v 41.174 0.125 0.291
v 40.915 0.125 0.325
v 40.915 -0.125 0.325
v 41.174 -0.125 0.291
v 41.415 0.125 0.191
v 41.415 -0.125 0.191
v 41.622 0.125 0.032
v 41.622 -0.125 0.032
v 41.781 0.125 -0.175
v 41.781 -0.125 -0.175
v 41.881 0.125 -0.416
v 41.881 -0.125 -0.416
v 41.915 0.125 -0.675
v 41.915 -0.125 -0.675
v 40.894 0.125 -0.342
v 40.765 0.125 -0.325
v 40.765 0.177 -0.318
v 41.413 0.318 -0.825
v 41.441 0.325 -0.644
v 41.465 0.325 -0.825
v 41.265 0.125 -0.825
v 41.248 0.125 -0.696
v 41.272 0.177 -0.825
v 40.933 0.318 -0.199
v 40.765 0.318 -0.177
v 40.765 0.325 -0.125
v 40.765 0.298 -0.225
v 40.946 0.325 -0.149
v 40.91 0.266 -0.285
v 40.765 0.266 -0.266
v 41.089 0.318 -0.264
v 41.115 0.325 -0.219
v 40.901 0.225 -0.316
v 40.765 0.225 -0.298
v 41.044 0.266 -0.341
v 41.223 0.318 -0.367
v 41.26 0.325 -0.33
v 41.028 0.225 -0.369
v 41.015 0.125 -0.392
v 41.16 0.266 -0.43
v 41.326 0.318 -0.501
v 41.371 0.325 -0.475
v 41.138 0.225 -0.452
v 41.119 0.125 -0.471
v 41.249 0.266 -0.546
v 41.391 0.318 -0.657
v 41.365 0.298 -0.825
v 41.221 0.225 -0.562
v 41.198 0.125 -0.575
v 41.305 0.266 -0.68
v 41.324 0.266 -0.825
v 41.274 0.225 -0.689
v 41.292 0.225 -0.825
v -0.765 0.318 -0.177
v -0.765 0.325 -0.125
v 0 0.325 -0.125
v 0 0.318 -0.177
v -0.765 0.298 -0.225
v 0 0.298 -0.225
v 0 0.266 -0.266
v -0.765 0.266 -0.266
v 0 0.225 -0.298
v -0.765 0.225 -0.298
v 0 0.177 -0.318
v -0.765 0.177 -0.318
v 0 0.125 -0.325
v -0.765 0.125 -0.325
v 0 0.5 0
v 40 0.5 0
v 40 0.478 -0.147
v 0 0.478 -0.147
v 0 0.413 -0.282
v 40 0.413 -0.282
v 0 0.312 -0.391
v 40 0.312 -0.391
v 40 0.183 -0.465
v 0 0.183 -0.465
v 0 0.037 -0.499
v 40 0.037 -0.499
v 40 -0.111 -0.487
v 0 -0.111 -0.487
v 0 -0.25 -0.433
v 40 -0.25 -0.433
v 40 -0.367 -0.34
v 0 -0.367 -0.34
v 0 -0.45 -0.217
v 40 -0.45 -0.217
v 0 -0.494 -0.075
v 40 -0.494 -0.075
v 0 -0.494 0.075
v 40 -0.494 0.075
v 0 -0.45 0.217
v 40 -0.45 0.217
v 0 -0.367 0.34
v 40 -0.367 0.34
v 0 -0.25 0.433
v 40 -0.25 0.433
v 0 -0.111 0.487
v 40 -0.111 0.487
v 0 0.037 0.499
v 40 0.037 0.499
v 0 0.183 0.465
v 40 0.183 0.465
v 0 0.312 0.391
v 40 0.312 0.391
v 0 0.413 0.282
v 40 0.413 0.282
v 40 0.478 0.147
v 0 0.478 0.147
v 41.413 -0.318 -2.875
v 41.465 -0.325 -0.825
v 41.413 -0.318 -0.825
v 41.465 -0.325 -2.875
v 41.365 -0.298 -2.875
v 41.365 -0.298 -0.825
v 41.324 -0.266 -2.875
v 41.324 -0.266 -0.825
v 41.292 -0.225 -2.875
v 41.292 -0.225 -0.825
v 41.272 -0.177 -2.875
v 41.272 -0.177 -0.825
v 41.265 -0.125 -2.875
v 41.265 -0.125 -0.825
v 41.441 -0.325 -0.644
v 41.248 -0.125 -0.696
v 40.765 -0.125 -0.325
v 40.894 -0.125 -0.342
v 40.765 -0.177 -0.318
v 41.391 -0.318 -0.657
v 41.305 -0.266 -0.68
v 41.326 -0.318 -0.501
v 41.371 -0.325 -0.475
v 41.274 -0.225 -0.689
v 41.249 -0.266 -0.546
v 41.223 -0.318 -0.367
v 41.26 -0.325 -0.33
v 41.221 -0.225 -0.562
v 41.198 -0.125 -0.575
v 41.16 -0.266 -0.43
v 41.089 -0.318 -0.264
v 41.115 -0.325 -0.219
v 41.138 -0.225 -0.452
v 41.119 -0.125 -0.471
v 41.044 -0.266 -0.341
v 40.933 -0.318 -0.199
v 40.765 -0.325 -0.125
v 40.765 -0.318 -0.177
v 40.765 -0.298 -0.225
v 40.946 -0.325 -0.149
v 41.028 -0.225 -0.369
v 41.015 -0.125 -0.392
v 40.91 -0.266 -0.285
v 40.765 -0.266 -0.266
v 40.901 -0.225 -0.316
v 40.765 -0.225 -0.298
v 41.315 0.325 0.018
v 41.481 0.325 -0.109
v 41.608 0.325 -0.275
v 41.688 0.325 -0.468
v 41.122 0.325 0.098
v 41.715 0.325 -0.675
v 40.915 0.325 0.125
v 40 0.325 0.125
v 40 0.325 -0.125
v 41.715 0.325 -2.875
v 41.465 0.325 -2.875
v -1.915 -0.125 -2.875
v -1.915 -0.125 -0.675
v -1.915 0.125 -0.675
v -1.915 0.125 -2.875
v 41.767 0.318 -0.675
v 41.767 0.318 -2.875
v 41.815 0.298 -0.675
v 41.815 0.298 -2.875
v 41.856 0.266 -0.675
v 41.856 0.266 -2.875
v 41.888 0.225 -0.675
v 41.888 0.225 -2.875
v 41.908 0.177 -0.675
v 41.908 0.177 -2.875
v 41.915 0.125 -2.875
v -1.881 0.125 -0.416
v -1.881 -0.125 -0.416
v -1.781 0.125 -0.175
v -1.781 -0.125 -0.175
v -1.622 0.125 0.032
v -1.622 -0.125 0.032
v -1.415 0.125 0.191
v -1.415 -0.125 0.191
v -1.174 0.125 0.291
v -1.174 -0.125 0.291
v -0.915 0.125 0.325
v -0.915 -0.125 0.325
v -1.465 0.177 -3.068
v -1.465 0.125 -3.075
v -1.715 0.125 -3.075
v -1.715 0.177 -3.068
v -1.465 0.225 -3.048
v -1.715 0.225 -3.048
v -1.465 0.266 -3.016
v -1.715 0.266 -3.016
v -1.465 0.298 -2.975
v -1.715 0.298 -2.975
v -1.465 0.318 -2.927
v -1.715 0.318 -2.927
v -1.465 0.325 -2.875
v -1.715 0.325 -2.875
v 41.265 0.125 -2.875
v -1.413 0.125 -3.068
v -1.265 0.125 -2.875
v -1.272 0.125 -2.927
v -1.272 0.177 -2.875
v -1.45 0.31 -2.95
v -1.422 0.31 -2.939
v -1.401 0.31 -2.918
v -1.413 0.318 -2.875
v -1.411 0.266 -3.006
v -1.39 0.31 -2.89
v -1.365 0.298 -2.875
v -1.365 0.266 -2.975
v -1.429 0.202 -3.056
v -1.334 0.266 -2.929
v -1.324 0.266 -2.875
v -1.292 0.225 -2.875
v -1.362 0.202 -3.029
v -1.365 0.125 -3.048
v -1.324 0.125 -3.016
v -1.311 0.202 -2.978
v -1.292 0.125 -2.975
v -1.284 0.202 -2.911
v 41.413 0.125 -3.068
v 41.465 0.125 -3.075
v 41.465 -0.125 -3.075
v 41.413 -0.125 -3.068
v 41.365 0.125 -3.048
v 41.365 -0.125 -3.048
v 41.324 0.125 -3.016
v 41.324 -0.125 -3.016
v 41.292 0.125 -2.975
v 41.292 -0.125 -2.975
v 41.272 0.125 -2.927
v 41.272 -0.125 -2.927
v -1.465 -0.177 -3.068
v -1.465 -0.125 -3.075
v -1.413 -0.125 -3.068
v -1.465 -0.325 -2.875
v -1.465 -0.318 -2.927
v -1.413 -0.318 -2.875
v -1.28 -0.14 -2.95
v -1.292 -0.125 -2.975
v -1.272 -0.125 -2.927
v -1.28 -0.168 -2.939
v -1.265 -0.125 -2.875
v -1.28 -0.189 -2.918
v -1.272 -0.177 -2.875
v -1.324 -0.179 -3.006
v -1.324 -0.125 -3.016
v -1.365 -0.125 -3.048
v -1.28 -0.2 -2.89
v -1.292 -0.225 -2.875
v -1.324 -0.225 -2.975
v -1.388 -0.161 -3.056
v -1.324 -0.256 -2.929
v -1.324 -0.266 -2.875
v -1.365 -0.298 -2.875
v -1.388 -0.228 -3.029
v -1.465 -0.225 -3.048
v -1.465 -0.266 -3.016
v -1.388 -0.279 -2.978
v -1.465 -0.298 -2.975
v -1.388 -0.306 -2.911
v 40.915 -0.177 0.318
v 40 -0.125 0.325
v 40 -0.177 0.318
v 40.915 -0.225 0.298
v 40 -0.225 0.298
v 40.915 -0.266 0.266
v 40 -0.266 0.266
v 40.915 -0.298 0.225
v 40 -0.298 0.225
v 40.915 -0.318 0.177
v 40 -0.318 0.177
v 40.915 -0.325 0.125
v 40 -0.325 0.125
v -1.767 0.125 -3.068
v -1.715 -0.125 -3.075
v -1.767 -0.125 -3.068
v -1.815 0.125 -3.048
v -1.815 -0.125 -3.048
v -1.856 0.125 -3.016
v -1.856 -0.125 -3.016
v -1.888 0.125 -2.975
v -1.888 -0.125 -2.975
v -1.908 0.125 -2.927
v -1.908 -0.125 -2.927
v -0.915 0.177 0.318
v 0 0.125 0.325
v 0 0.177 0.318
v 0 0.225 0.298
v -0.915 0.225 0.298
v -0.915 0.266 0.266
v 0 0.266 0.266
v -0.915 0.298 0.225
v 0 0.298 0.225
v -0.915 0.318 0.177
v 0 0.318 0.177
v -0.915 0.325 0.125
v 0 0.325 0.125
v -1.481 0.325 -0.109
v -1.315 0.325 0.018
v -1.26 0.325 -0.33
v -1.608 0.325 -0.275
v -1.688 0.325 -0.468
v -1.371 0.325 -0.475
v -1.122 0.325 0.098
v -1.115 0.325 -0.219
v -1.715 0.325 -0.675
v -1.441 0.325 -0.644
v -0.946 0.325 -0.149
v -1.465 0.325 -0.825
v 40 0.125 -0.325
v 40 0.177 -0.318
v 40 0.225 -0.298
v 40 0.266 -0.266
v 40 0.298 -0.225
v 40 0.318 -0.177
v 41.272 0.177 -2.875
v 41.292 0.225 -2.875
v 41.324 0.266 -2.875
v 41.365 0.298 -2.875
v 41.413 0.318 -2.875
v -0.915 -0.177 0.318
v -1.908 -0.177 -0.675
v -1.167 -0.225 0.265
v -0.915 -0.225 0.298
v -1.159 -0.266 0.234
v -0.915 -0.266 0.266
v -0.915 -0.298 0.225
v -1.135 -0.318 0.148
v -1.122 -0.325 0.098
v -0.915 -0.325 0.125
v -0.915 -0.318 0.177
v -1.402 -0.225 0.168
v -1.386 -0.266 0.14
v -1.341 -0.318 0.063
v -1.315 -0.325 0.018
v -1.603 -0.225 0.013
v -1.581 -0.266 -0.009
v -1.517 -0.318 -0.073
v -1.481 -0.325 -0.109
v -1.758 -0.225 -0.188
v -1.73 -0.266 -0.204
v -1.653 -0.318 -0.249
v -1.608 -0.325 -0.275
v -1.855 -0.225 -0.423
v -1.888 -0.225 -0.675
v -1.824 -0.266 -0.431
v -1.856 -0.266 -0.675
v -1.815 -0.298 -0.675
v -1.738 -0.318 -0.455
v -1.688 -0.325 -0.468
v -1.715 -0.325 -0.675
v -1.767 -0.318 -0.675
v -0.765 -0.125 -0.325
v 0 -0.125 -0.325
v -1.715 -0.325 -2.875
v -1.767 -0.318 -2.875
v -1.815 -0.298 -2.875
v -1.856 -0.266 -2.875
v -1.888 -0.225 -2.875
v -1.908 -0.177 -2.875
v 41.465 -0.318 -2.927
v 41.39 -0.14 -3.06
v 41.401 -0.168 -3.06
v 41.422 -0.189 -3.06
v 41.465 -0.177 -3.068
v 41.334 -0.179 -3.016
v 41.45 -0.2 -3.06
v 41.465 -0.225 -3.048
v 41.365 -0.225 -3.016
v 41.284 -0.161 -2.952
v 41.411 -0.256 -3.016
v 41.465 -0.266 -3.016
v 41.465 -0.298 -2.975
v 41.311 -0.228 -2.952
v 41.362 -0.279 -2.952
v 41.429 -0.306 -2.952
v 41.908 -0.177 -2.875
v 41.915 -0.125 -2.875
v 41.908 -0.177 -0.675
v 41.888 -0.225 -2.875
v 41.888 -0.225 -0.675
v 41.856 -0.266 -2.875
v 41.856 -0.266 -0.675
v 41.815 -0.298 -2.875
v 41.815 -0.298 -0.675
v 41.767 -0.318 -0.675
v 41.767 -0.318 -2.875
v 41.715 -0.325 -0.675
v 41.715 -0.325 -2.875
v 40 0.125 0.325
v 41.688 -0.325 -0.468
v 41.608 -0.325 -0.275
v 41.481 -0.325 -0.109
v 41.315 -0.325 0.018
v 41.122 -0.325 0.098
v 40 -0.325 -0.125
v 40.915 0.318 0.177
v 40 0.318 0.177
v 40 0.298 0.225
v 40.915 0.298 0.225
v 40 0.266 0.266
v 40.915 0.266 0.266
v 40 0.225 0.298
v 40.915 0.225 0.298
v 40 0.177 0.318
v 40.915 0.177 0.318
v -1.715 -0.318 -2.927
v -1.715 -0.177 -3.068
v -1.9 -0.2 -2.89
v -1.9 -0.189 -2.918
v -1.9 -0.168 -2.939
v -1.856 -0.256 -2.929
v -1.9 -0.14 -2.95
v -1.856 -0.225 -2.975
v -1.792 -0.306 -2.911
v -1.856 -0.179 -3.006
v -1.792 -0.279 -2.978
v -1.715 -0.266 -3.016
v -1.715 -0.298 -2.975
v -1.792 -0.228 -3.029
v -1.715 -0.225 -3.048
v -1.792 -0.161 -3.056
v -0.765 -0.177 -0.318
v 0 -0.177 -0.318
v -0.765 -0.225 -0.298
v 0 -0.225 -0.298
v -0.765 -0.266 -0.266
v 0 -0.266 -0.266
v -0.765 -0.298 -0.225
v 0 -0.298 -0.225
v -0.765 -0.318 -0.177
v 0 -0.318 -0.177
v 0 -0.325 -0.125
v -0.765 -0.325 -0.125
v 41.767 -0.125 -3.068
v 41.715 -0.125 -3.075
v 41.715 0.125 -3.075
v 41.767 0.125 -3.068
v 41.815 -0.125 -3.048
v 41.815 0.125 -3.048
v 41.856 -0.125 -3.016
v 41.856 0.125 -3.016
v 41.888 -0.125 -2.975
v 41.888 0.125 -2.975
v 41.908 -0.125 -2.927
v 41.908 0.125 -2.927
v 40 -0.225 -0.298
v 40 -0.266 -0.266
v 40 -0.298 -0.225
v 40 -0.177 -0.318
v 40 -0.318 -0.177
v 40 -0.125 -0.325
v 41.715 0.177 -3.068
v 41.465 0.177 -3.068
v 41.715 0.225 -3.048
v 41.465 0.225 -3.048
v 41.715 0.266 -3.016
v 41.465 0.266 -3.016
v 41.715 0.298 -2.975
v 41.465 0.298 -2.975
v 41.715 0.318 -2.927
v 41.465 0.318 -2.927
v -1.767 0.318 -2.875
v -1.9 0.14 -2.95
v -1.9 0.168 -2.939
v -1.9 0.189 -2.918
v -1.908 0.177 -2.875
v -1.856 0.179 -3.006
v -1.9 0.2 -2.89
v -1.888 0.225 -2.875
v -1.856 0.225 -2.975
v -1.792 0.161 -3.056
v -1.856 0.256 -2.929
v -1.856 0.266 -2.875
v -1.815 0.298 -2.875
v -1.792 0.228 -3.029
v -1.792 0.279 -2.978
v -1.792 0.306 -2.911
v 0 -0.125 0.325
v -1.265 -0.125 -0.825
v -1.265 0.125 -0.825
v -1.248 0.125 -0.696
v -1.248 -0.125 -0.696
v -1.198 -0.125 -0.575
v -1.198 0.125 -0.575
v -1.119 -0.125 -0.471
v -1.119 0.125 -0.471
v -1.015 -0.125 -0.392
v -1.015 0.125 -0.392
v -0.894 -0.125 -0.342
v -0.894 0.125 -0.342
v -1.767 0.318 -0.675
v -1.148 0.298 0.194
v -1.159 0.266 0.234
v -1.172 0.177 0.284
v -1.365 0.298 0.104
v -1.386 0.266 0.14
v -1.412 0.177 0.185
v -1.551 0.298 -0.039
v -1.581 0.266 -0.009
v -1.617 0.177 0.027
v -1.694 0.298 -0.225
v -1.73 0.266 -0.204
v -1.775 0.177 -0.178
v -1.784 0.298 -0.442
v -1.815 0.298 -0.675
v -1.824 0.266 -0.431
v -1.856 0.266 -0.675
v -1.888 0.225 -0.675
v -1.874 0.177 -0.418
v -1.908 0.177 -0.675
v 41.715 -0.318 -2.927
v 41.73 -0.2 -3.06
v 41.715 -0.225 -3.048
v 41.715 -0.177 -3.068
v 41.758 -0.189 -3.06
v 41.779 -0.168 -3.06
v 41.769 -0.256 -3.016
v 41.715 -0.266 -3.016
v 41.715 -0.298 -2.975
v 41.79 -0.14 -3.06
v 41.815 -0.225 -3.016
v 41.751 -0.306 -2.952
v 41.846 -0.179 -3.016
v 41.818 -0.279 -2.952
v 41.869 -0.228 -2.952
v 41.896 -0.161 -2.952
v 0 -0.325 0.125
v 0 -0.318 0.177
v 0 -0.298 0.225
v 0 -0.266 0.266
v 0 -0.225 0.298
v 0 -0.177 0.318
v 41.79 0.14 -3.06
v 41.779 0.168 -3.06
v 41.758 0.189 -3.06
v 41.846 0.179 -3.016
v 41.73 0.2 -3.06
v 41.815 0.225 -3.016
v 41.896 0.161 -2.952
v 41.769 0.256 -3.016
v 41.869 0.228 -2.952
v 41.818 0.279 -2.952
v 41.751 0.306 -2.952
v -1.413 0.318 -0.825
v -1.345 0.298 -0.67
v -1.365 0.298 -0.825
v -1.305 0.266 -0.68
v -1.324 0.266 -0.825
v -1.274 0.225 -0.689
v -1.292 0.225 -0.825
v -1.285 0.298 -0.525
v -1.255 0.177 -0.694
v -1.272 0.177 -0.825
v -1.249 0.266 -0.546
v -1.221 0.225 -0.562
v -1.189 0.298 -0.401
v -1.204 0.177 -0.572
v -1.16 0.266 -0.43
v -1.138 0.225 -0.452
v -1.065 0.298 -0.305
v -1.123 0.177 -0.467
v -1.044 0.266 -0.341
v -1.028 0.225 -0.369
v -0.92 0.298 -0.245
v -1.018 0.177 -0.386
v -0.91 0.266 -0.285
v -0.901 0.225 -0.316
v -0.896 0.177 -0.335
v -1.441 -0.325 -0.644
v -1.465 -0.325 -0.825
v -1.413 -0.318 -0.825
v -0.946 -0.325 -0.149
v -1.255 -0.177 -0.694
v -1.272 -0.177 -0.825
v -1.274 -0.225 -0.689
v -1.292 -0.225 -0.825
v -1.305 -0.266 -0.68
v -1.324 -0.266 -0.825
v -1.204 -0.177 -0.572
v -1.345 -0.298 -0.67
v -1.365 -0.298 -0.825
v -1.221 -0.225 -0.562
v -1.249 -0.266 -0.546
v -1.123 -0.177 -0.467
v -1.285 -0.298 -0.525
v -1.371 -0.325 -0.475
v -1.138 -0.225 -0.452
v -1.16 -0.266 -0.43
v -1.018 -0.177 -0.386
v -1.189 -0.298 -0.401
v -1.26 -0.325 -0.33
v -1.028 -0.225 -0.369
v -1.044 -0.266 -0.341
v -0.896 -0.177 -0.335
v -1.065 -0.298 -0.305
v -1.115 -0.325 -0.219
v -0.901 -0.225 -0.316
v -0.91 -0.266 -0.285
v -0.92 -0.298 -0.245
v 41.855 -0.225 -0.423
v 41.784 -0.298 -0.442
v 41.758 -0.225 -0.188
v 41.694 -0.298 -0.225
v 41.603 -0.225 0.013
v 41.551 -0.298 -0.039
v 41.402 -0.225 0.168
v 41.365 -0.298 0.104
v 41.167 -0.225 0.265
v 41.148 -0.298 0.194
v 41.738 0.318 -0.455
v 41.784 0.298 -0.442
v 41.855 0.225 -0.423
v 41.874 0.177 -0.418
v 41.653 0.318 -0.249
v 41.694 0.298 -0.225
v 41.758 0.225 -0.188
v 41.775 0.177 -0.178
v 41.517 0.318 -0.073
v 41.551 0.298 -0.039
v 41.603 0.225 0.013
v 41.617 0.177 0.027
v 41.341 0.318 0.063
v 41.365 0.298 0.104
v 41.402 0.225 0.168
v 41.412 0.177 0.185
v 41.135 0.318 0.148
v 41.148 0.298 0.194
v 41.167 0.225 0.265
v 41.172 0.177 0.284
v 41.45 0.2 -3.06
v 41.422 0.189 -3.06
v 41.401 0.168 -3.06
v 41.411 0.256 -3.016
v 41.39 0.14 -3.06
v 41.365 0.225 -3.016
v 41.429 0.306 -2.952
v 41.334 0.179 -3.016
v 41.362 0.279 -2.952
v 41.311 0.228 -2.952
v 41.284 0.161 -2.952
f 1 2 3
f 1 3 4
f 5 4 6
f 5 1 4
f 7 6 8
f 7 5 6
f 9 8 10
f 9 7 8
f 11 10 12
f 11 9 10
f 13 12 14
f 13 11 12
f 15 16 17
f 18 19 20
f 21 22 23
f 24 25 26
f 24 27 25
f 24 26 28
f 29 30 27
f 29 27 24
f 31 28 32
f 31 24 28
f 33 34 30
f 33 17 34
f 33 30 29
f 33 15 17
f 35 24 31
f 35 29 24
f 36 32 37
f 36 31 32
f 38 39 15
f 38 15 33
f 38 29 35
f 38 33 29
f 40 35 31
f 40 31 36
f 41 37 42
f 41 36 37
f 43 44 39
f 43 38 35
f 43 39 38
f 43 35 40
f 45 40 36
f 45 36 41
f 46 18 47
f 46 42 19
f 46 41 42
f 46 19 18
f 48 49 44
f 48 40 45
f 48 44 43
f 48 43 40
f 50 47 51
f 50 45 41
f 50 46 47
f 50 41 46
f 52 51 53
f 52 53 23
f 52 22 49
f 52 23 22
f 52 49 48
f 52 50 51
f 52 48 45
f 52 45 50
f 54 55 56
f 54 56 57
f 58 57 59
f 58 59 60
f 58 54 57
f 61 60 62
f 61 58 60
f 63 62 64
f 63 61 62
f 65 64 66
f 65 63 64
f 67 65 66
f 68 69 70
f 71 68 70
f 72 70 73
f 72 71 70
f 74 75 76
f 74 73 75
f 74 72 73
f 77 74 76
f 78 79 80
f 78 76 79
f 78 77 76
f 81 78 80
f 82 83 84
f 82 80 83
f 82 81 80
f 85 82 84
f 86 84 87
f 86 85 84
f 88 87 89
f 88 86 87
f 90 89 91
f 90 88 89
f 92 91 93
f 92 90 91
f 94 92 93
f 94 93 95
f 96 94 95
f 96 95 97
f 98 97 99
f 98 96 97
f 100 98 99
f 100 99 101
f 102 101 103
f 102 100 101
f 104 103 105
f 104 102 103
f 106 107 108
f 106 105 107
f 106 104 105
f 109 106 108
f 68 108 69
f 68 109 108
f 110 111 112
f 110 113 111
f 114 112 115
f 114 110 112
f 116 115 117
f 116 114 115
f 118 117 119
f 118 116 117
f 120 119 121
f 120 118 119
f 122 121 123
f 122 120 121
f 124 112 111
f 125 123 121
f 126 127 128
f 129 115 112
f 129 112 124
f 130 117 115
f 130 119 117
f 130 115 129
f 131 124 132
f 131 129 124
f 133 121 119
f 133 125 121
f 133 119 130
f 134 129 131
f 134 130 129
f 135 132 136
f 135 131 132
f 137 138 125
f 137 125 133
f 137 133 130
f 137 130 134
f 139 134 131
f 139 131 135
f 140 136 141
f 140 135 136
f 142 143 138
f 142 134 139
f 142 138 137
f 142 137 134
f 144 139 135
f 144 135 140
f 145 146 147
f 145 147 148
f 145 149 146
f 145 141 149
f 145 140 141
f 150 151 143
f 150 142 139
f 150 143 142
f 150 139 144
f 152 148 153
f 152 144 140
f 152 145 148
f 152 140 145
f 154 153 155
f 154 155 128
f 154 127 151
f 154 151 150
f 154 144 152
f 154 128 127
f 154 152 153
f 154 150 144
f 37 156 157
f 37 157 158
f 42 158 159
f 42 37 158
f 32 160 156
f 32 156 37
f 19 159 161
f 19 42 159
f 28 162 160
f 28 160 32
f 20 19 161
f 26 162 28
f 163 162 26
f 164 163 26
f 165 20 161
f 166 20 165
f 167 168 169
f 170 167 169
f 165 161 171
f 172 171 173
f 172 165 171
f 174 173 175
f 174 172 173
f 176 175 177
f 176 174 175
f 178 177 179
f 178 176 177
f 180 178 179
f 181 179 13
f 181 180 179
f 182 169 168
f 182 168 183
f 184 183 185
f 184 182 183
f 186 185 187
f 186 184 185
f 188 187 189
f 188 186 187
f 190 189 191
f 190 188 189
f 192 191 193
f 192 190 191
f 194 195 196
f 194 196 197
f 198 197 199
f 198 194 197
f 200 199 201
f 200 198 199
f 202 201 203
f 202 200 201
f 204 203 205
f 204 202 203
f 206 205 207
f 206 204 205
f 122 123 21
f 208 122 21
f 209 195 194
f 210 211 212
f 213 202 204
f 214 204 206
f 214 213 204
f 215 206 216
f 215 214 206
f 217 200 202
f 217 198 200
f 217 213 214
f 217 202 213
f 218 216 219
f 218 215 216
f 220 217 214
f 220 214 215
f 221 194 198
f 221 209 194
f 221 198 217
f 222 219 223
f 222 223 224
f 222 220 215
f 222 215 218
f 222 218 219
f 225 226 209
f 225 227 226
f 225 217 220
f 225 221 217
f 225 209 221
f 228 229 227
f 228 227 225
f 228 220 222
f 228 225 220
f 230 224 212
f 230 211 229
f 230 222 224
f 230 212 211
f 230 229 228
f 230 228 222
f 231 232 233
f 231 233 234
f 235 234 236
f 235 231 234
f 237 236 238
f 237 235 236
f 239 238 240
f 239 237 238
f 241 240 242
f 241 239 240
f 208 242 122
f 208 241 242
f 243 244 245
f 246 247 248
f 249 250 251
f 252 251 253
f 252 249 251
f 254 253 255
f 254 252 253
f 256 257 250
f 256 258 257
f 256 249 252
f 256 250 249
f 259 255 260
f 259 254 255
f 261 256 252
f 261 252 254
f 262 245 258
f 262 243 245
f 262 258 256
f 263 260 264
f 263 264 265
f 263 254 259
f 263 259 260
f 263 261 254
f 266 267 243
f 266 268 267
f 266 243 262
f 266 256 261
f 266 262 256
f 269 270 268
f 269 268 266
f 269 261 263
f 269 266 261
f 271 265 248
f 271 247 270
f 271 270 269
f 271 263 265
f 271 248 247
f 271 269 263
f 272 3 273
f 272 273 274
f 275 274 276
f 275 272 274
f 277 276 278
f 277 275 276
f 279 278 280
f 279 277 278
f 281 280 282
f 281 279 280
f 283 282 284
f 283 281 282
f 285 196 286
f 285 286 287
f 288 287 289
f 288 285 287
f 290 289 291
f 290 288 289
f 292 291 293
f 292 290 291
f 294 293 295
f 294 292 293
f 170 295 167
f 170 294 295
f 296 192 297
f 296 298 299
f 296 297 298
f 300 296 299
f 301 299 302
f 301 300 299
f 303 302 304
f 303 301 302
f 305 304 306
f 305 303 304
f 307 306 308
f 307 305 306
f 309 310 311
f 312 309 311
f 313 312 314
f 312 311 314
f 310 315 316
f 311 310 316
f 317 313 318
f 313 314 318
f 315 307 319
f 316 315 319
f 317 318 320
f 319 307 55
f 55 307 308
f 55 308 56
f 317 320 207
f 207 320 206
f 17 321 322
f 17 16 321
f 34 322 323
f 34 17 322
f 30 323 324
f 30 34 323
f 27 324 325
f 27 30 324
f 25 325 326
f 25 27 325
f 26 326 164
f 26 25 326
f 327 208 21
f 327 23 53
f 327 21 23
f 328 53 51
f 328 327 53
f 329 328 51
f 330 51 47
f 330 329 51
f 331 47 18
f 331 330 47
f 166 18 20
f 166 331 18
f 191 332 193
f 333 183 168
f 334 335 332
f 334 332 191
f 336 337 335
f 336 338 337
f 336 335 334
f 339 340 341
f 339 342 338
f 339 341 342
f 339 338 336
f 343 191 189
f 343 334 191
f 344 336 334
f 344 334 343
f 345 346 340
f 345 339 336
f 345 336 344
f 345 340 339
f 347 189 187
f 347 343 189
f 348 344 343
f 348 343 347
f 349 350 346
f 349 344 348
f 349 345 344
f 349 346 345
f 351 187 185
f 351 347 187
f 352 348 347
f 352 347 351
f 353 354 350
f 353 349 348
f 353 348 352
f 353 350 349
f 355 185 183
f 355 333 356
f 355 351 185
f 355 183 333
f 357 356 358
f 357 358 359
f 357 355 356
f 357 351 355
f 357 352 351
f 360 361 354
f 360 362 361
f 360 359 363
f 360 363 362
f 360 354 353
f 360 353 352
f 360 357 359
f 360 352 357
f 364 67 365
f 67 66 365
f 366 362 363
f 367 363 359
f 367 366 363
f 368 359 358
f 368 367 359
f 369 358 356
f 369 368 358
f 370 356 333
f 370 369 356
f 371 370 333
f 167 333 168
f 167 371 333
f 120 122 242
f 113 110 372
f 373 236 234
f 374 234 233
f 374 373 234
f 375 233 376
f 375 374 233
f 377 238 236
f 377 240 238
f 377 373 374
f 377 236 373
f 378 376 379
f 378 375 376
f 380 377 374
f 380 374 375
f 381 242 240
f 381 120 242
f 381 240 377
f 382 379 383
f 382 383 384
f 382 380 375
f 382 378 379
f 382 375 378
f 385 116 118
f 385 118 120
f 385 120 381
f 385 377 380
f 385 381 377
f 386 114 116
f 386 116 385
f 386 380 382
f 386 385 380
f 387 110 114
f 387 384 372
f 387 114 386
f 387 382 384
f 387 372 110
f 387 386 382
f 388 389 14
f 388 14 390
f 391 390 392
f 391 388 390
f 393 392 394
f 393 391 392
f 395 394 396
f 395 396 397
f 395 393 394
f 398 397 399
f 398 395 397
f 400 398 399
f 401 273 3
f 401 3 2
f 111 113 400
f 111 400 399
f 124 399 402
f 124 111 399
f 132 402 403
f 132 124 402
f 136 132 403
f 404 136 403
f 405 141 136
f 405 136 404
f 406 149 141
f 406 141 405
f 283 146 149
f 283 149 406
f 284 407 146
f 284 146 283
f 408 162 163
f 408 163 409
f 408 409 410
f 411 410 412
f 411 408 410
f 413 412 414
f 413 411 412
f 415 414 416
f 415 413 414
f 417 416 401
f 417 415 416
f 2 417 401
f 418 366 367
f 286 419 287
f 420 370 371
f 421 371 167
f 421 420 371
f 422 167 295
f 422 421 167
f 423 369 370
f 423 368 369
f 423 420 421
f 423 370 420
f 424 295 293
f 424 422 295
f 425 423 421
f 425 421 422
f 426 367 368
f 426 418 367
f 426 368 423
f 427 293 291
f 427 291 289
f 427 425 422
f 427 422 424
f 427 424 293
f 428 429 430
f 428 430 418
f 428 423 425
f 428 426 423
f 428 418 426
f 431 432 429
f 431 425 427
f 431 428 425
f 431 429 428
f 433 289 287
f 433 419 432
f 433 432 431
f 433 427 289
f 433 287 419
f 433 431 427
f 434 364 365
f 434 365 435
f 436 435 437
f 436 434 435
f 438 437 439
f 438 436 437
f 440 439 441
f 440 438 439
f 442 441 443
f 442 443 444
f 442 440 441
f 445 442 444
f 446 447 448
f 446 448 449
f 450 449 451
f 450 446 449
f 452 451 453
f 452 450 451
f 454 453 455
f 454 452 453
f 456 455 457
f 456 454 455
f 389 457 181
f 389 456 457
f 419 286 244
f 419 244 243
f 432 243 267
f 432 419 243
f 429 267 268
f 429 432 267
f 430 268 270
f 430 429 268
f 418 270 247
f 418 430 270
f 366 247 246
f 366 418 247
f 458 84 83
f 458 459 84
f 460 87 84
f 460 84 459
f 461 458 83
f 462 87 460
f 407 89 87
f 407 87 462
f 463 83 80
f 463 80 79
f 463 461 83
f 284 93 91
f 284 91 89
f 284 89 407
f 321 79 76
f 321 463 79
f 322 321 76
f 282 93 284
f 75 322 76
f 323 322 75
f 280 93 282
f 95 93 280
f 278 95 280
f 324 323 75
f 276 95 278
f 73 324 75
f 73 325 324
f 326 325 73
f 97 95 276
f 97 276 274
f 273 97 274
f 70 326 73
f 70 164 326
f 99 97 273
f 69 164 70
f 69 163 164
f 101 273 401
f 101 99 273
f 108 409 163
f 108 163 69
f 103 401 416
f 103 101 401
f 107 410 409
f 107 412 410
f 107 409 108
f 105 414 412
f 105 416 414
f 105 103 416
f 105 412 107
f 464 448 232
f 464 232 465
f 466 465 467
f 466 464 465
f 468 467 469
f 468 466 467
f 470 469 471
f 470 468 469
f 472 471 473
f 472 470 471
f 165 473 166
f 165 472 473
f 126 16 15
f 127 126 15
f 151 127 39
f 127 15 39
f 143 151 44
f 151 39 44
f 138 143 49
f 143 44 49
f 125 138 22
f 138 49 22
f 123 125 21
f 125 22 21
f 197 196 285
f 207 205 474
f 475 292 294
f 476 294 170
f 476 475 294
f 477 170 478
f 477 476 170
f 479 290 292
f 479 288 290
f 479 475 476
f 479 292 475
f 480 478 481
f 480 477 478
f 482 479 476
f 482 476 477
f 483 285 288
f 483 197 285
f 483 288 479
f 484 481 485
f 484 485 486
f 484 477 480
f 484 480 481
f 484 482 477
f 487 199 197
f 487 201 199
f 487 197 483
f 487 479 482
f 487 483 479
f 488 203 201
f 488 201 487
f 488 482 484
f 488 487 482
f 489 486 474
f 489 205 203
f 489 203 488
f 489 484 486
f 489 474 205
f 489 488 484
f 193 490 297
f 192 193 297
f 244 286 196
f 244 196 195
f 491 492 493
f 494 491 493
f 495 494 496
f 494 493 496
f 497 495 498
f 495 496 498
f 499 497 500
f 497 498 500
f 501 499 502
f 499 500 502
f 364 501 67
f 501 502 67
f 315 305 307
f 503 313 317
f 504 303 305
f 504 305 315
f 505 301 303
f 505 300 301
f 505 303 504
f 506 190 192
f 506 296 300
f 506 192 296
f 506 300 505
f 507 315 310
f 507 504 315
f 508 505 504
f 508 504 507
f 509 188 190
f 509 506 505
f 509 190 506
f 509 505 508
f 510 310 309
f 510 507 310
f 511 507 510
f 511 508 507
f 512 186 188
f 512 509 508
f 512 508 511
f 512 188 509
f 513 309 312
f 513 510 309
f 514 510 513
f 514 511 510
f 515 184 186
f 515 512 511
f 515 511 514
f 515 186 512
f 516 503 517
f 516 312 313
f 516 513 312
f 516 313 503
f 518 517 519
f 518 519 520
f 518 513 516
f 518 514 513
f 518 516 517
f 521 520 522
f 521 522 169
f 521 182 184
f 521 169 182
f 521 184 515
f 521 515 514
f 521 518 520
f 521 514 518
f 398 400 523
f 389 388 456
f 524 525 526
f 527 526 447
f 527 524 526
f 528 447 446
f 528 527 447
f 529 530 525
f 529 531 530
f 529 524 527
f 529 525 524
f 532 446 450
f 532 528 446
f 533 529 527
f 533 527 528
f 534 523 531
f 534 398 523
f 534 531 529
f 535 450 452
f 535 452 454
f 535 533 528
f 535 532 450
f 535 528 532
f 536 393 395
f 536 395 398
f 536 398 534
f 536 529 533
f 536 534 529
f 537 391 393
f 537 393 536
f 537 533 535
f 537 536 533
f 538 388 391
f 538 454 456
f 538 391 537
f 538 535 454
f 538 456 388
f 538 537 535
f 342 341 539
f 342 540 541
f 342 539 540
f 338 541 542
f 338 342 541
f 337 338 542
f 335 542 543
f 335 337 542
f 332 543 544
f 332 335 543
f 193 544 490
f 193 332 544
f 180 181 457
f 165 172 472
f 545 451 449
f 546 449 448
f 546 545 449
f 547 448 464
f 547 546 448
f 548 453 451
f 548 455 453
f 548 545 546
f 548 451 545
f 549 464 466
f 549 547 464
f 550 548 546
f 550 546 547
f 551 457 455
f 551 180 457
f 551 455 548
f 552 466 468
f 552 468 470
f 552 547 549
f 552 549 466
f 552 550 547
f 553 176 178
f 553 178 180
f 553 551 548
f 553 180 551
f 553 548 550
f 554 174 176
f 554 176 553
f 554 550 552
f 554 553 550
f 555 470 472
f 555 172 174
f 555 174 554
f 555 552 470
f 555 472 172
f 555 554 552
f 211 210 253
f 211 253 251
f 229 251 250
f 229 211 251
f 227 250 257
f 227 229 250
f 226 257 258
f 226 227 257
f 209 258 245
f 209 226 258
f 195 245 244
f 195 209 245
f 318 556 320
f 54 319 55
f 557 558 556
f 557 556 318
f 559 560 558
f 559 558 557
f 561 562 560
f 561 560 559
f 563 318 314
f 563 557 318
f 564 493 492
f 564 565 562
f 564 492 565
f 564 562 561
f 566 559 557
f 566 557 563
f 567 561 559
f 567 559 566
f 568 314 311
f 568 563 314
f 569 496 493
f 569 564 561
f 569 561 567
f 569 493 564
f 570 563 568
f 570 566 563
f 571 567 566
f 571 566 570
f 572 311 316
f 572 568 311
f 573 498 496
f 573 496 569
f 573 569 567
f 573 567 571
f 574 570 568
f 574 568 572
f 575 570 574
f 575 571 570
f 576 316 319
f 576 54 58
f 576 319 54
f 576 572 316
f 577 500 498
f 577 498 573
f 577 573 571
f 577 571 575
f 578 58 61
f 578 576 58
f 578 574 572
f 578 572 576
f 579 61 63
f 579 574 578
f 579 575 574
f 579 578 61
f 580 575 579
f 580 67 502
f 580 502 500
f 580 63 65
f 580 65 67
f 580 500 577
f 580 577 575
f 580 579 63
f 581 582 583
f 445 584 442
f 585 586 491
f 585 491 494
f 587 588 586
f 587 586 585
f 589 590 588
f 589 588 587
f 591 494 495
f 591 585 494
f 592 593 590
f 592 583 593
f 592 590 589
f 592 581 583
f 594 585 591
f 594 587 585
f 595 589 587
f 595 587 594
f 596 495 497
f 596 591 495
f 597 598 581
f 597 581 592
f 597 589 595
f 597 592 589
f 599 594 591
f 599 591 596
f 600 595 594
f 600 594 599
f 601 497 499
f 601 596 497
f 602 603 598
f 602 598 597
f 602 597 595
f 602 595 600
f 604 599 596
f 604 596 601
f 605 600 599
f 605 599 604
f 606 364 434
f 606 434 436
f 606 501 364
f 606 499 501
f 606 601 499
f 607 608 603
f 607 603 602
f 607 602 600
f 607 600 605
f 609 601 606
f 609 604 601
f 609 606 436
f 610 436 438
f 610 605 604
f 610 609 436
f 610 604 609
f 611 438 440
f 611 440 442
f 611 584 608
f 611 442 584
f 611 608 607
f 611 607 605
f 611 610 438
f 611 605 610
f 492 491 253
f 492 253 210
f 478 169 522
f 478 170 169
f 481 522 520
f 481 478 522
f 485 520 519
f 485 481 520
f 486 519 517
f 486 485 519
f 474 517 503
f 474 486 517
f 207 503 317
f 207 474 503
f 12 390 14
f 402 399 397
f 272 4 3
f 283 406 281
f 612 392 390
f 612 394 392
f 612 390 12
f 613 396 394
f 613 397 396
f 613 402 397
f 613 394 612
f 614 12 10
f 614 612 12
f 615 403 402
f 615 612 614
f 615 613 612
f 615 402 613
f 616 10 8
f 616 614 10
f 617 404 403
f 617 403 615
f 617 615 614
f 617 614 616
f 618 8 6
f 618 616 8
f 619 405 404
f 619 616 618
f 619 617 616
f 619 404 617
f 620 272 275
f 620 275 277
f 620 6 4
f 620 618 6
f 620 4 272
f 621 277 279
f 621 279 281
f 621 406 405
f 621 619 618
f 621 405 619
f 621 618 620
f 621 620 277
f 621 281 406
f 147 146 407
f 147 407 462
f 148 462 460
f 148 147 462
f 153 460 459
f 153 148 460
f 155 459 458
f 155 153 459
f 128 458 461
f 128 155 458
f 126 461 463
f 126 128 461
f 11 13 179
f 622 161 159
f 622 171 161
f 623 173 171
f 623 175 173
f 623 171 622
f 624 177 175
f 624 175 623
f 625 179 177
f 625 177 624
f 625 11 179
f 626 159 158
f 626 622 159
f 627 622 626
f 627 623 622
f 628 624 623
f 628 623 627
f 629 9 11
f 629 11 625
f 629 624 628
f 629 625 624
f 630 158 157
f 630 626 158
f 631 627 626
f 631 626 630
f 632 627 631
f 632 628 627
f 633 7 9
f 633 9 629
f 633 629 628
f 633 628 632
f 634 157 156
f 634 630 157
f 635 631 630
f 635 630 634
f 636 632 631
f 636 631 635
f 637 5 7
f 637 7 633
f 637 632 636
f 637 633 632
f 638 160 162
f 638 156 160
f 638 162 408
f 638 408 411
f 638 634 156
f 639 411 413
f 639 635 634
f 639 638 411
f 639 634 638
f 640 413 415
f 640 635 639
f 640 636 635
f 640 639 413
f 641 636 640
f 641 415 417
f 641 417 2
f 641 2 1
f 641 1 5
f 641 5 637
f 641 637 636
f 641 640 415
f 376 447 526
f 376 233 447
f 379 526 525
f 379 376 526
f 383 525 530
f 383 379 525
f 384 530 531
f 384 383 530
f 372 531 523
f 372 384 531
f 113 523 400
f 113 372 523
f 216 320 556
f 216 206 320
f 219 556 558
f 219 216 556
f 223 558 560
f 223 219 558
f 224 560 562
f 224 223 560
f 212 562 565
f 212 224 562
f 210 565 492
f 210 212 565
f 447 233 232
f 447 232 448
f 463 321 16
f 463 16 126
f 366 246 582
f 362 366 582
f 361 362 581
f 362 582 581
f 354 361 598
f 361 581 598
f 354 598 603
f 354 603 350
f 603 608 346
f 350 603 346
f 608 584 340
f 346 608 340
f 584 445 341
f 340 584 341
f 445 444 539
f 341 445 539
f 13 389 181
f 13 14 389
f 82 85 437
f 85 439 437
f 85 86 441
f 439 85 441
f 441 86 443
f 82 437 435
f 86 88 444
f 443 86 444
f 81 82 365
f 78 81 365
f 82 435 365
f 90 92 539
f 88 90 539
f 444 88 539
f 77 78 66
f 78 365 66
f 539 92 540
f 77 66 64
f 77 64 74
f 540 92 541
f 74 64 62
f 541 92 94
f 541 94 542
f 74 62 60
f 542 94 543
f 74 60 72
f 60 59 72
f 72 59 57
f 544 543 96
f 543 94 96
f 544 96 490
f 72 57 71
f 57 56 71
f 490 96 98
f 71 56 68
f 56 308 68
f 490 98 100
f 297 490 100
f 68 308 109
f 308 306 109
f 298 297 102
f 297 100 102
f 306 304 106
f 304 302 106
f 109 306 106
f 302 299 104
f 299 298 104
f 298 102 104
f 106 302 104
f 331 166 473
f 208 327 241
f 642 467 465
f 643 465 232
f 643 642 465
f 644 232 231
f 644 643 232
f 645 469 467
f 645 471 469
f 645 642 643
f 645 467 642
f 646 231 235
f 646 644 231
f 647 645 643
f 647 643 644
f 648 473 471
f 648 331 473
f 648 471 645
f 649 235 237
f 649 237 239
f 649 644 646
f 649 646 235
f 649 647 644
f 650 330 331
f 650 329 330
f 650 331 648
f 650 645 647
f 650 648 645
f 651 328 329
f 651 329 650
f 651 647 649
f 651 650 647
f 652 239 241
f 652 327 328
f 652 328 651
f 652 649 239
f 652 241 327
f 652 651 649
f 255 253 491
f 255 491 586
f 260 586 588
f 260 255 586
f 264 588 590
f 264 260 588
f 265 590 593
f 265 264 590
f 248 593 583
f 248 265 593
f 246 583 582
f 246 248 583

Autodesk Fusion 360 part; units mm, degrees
sketch "Sketch1" plane through (0, 0, 0) normal (1, 0, 0) x (0, 1, 0)
  circle A0 centre (0, 0) radius 0.5
  line L0 (0.325, -0.325) -> (-0.325, -0.325)
  line L1 (-0.325, -0.325) -> (-0.325, 0.325)
  line L2 (-0.325, 0.325) -> (0.325, 0.325)
  line L3 (0.325, 0.325) -> (0.325, -0.325)
  line L4 (0.325, -0.325) -> (-0.325, 0.325) construction
  line L5 (-0.325, -0.325) -> (0.325, 0.325) construction
  dimension "d1" = 1
  dimension "d2" = 0.65
  dimension "d3" = 0.65
extrude "Extrude1" add sketch "Sketch1" along normal blind 40 contours A0 | L0 L1 L2 L3
sketch "Sketch2" plane through (40, 0, 0) normal (1, 0, 0) x (0, 1, 0)
  circle A0 centre (0, 0) radius 0.5
  line L0 (0.325, -0.325) -> (-0.325, -0.325)
  line L1 (-0.325, -0.325) -> (-0.325, 0.325)
  line L2 (-0.325, 0.325) -> (0.325, 0.325)
  line L3 (0.325, 0.325) -> (0.325, -0.325)
  line L4 (0.325, -0.325) -> (-0.325, 0.325) construction
  line L5 (-0.325, -0.325) -> (0.325, 0.325) construction
  dimension "d8" = 0.65
  dimension "d9" = 0.65
extrude "Extrude2" add sketch "Sketch2" along normal blind 1.915 contours L0 L1 L2 L3
extrude "Extrude3" add sketch "Sketch1" against normal blind 1.915 contours L0 L1 L2 L3
sketch "Sketch3" plane through (0, 0, -0.325) normal (0, 0, -1) x (1, 0, 0)
  line L0 (40, 0.325) -> (40, -0.325)
  line L1 (40, -0.325) -> (41.915, -0.325)
  line L2 (41.915, -0.325) -> (41.915, 0.325)
  line L3 (41.915, 0.325) -> (40, 0.325)
  line L4 (41.915, 0.325) -> (41.265, 0.325)
  line L5 (41.265, 0.325) -> (41.265, -0.325)
  line L6 (41.265, -0.325) -> (41.915, -0.325)
  line L7 (41.915, -0.325) -> (41.915, 0.325)
  line L8 (41.915, 0.325) -> (41.265, -0.325) construction
  line L9 (41.265, 0.325) -> (41.915, -0.325) construction
  point P0 (41.59, 0)
  dimension "d14" = 0.65
  dimension "d15" = 0.65
sketch "Sketch4" plane through (0, 0, -0.325) normal (0, 0, -1) x (1, 0, 0)
  line L0 (0, -0.325) -> (0, 0.325)
  line L1 (0, 0.325) -> (-1.915, 0.325)
  line L2 (-1.915, 0.325) -> (-1.915, -0.325)
  line L3 (-1.915, -0.325) -> (0, -0.325)
  line L4 (-1.265, -0.325) -> (-1.915, -0.325)
  line L5 (-1.915, -0.325) -> (-1.915, 0.325)
  line L6 (-1.915, 0.325) -> (-1.265, 0.325)
  line L7 (-1.265, 0.325) -> (-1.265, -0.325)
  line L8 (-1.265, -0.325) -> (-1.915, 0.325) construction
  line L9 (-1.915, -0.325) -> (-1.265, 0.325) construction
  point P0 (-1.59, 0)
  dimension "d17" = 0.65
  dimension "d18" = 0.65
extrude "Extrude4" add sketch "Sketch4" sketch "Sketch3" along normal blind 2.75 contours L1 L2 L3 L4 L5 L6 L7 of sketch 2 contours L1 L2 L3 L4 L5 L6 L7
fillet "Fillet1" radius 0.5 2 edges at (-1.265, 0, -0.325) (41.265, 0, -0.325)
fillet "Fillet2" radius 1 2 edges at (-1.915, 0, 0.325) (41.915, 0, 0.325)
fillet "Fillet3" radius 0.2 28 edges at (-1.59, -0.325, -3.075) (-1.265, 0, -3.075) (-1.59, 0.325, -3.075) (-1.915, 0, -3.075) (-1.1186, -0.325, -0.4714) (-1.265, -0.325, -1.95) (-0.4575, -0.325, 0.325) (-1.6221, -0.325, 0.0321) (-1.915, -0.325, -1.875) (-0.4575, 0.325, 0.325) (-1.6221, 0.325, 0.0321) (-1.915, 0.325, -1.875) (-1.1186, 0.325, -0.4714) (-1.265, 0.325, -1.95) (40.4575, -0.325, 0.325) (41.6221, -0.325, 0.0321) (41.915, -0.325, -1.875) (41.265, -0.325, -1.95) (41.1186, -0.325, -0.4714) (41.915, 0.325, -1.875) (41.6221, 0.325, 0.0321) (40.4575, 0.325, 0.325) (41.1186, 0.325, -0.4714) (41.265, 0.325, -1.95) (41.59, 0.325, -3.075) (41.915, 0, -3.075) (41.59, -0.325, -3.075) (41.265, 0, -3.075)
equation "d1 = width"
equation "d2 = d3"
equation "d3 = d1 * 0.65"
equation "width = 1 mm"
equation "baseLenght = 40 mm"
equation "d6 = baseLenght"
equation "d8 = width * 0.65"
equation "d9 = d8"
equation "d10 = ( ( 2.54 * ceil(( baseLenght + 1.3 * width ) / 2.54 mm) ) * 1 mm + 0.65 * width - baseLenght ) / 2"
equation "d12 = -( ( 2.54 * ceil(( baseLenght + 1.3 * width ) / 2.54 mm) ) * 1 mm + 0.65 * width - baseLenght ) / 2"
equation "d14 = width * 0.65"
equation "d15 = d14"
equation "d17 = width * 0.65"
equation "d18 = d17"
equation "d26 = 0.2 * width"
